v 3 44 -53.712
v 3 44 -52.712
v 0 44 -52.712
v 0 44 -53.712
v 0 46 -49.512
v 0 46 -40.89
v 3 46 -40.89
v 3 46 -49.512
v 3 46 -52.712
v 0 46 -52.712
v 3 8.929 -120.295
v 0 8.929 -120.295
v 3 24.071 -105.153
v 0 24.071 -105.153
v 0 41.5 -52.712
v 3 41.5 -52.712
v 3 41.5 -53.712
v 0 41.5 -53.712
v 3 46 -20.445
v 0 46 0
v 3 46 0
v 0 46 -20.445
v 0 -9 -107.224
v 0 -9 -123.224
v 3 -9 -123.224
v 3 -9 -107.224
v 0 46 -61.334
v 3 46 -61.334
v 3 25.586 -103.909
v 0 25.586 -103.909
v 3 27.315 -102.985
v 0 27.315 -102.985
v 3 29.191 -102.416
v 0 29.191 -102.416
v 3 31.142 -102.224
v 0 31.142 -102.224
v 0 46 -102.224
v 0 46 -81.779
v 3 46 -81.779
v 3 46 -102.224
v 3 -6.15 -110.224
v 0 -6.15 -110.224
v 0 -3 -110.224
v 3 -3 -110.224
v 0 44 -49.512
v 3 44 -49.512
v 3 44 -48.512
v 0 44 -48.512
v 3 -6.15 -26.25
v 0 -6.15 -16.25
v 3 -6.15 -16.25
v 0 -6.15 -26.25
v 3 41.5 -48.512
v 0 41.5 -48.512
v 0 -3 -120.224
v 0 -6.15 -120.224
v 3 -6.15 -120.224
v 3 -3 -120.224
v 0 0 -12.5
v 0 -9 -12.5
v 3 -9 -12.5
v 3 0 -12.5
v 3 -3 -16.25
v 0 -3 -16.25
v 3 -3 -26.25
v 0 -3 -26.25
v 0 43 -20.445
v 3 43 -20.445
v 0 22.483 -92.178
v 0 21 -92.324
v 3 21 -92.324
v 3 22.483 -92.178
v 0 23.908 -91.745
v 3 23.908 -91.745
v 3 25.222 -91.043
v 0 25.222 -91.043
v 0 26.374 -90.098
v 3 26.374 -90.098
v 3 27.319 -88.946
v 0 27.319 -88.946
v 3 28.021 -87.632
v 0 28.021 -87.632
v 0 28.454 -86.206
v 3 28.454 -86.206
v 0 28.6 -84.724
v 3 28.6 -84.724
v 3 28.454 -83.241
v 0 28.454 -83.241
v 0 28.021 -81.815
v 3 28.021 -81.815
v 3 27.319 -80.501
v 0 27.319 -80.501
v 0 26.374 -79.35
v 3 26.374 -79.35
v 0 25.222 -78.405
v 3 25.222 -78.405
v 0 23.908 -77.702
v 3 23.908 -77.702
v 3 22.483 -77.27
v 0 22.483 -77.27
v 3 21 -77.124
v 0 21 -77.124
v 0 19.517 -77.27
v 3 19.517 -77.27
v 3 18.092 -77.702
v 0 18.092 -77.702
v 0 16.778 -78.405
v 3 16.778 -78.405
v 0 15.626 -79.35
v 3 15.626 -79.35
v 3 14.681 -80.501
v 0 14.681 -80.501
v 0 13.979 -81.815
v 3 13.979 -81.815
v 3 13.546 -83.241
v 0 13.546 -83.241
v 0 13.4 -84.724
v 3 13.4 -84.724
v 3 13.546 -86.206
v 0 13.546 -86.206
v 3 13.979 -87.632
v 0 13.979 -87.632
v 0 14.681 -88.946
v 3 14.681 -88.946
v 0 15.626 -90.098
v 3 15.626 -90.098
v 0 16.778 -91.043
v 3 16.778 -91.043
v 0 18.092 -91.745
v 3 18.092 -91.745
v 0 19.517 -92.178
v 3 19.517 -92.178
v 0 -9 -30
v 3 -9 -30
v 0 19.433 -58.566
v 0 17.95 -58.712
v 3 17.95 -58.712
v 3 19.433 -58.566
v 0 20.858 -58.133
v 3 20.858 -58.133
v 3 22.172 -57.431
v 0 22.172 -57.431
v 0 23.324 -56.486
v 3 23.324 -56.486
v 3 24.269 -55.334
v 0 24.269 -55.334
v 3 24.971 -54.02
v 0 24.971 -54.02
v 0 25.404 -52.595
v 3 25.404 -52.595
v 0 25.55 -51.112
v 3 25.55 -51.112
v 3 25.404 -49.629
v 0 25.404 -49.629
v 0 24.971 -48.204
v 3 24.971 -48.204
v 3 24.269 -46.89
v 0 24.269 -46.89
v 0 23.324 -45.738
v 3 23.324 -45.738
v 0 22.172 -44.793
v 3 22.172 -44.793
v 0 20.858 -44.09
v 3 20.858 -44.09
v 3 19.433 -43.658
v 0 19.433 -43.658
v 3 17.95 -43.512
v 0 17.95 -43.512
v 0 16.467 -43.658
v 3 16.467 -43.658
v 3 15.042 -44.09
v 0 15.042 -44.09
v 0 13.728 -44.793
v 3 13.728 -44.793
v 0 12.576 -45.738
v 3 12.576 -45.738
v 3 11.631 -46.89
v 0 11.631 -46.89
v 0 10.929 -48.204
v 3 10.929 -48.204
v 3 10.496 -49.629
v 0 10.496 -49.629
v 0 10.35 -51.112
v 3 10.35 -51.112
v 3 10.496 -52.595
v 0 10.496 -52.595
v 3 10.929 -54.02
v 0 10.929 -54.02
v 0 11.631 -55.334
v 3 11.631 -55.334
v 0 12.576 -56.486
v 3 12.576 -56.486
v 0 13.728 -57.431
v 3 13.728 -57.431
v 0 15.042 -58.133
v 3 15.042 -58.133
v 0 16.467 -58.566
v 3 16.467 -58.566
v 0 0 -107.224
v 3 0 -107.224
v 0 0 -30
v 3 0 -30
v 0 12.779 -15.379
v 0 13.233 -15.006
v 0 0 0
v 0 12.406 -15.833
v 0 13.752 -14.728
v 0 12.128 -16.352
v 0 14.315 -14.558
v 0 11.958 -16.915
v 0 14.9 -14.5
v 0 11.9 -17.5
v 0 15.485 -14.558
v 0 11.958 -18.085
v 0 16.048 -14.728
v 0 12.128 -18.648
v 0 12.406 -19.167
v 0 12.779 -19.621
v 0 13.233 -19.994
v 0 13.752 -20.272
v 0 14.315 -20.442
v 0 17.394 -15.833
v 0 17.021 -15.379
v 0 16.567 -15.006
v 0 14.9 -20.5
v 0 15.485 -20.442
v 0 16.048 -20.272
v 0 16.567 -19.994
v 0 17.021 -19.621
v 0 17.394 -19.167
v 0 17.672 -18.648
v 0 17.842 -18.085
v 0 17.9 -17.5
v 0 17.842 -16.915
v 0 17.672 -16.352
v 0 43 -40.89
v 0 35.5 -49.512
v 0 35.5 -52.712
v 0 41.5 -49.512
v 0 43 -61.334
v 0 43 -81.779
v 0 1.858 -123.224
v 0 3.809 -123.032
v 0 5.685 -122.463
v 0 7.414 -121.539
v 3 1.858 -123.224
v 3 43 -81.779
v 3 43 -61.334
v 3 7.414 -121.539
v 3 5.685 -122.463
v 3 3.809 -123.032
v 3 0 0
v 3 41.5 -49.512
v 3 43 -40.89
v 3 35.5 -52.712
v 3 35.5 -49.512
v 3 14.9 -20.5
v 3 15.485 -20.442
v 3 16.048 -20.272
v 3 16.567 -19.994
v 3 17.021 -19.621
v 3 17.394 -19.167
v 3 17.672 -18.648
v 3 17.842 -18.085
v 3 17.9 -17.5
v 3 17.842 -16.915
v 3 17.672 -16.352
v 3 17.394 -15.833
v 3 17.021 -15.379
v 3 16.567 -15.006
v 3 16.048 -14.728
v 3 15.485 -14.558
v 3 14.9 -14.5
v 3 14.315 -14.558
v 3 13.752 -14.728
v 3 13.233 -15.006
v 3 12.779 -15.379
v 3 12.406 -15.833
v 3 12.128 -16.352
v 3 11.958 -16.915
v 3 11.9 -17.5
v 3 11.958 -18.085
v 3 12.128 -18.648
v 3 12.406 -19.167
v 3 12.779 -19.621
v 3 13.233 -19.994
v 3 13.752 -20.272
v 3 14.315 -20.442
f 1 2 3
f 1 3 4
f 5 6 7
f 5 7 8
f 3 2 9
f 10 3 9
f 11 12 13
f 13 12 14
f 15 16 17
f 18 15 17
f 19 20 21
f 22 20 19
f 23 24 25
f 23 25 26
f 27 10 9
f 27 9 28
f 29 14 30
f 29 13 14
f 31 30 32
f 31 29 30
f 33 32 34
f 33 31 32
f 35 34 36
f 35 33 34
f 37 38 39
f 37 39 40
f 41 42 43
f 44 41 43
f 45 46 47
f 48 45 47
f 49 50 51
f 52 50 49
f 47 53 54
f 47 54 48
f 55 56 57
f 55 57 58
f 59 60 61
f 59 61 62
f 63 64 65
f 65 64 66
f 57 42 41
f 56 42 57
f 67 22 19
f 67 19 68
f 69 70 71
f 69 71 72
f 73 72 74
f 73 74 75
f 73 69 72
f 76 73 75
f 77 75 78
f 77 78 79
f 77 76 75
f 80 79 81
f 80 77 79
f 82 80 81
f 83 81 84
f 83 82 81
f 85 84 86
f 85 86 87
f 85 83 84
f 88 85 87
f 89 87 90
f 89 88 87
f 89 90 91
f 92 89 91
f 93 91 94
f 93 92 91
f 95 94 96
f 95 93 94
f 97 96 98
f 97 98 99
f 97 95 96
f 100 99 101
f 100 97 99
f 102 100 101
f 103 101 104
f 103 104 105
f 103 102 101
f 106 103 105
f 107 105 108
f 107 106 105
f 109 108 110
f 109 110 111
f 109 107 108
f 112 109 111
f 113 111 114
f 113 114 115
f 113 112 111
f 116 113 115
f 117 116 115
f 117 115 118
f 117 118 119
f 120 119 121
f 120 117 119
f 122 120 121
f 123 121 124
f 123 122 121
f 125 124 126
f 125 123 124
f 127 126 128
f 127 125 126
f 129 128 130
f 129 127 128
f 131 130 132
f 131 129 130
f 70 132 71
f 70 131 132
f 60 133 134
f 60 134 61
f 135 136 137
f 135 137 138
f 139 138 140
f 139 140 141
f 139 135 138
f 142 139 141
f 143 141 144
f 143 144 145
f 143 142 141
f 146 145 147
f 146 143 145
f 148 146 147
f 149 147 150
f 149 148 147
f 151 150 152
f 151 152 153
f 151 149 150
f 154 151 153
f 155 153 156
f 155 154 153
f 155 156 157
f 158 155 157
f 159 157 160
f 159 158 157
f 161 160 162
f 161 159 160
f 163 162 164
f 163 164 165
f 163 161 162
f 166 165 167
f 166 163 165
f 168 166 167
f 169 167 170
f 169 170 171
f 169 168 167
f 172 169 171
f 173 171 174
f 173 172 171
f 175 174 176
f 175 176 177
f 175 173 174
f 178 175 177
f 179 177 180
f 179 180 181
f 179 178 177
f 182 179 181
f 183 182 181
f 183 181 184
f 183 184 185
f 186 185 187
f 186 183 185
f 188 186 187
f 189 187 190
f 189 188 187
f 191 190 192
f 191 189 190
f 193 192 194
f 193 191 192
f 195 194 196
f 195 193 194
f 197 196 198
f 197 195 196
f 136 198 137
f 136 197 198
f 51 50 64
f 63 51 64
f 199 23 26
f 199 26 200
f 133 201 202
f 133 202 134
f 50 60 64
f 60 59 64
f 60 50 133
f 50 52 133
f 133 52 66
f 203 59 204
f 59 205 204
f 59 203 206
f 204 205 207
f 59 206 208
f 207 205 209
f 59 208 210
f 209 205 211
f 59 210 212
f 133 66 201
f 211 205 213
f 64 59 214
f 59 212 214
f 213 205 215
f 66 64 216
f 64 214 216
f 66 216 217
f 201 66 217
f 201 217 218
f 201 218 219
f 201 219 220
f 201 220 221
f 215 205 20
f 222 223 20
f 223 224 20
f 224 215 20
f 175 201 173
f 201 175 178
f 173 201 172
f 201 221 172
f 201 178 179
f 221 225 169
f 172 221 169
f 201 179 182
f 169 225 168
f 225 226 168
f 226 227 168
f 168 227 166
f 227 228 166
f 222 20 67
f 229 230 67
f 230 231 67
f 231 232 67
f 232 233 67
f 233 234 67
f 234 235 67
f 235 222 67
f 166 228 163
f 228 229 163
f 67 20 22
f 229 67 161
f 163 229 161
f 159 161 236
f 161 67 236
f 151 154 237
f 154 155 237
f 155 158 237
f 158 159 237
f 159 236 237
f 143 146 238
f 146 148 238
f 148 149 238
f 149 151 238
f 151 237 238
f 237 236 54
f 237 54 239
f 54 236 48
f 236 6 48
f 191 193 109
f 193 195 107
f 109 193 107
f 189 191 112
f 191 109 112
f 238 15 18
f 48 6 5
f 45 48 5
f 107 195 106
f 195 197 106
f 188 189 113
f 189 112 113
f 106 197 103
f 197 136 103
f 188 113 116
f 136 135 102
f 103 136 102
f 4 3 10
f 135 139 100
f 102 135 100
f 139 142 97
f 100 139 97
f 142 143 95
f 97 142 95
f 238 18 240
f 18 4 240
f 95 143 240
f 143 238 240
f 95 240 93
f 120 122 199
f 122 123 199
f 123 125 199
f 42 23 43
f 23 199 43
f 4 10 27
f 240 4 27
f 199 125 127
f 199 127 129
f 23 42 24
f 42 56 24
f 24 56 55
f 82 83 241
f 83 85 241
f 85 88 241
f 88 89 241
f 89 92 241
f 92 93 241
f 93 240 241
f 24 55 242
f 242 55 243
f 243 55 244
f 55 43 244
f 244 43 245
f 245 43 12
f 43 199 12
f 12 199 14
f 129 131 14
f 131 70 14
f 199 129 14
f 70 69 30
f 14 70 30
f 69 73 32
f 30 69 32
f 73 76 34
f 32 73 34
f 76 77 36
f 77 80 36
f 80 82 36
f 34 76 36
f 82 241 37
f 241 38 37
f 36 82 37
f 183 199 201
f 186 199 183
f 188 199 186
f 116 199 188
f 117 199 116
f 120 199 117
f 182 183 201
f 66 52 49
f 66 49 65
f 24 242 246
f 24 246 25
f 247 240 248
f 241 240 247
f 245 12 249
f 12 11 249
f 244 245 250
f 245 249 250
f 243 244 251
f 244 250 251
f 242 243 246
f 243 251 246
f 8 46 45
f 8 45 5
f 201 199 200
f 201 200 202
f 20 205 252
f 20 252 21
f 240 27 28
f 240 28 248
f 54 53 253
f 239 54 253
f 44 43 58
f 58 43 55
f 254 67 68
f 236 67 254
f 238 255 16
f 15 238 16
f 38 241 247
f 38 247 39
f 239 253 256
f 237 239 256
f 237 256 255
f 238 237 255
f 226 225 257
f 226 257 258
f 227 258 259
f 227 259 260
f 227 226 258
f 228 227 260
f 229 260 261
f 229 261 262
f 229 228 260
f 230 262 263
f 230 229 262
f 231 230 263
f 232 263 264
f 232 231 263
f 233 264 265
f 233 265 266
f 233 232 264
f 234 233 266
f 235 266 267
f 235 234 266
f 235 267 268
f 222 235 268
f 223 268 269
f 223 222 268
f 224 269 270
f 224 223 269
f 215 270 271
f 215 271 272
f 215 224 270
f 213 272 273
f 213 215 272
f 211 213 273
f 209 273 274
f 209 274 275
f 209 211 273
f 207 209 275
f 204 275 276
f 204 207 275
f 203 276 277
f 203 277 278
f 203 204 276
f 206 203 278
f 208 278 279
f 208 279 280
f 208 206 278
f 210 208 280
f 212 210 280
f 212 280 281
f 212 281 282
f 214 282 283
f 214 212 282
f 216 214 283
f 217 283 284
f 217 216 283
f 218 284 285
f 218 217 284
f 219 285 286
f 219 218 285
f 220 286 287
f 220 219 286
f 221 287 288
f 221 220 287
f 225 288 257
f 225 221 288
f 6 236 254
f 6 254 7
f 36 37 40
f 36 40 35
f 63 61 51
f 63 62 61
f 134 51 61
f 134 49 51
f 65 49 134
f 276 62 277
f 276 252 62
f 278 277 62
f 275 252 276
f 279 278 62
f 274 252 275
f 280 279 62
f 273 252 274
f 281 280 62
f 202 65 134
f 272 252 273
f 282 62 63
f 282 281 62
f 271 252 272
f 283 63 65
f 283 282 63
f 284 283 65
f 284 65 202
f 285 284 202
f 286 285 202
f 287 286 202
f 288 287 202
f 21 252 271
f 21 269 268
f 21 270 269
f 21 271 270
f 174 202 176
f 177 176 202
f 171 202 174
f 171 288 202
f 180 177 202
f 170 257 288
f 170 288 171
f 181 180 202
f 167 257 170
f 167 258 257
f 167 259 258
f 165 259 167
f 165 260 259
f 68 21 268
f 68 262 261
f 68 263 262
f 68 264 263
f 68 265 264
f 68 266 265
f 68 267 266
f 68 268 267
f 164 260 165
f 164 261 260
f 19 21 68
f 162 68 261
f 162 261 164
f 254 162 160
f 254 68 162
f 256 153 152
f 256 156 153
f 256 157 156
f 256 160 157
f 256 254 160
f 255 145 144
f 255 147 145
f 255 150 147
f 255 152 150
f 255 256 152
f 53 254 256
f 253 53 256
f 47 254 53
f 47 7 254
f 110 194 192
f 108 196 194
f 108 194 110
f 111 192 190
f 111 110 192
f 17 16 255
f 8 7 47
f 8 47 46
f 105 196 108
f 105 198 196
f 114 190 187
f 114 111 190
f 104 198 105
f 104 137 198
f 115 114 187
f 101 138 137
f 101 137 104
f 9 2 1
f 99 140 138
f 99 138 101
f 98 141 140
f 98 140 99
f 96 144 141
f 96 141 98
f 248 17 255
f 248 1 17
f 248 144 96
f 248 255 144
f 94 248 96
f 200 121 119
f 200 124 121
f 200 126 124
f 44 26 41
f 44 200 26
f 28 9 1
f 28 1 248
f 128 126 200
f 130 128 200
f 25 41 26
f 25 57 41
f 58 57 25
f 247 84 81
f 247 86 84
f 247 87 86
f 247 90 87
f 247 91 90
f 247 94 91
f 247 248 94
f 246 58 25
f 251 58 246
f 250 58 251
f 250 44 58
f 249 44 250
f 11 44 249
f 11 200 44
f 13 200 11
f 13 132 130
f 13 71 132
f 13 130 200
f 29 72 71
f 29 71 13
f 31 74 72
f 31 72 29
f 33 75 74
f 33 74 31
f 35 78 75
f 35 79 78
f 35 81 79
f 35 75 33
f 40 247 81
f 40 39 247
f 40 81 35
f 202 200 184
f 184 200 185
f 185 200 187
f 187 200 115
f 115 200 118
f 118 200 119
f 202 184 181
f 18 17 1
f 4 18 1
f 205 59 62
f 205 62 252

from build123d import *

# Parameters (mm, degrees)
SKETCH1_R               = 7.6
SKETCH1_R_2             = 3
SKETCH1_W               = 10
SKETCH1_H               = 3.15
BOSS_EXTRUDE1_DEPTH     = 3
FILLET1_R               = 10
SKETCH2_W               = 3.2
SKETCH2_H               = 6
SKETCH2_H_2             = 2.5
SKETCH2_W_2             = 1
SKETCH2_H_3             = 2
CUT_EXTRUDE1_DEPTH      = 1
CUT_EXTRUDE1_DEPTH_BACK = 4


with BuildPart() as part:
    # Sketch1 → Boss-Extrude1 (new body)
    with BuildSketch(Plane(origin=(0, 0, 0), x_dir=(0, 0, -1), z_dir=(1, 0, 0))):
        Polygon((102.223805307, 6), (123.223805307, 6), (102.223805307, 27), align=None)
        Polygon((102.223805307, 6), (123.223805307, 6), (123.223805307, -9), (107.223805307, -9), (107.223805307, 0), (30, 0), (30, -9), (12.5, -9), (12.5, 0), (0, 0), (0, 46), (20.444761061, 46), (20.444761061, 43), (40.889522123, 43), (40.889522123, 46), (61.334283184, 46), (61.334283184, 43), (81.779044246, 43), (81.779044246, 46), (102.223805307, 46), align=None)
        with Locations((84.723805307, 21)):
            Circle(SKETCH1_R, mode=Mode.SUBTRACT)
        with Locations((51.111902654, 17.95)):
            Circle(SKETCH1_R, mode=Mode.SUBTRACT)
        with Locations((17.5, 14.9)):
            Circle(SKETCH1_R_2, mode=Mode.SUBTRACT)
        with Locations((115.223805307, -4.575)):
            Rectangle(SKETCH1_W, SKETCH1_H, mode=Mode.SUBTRACT)
        with Locations((21.25, -4.575)):
            Rectangle(SKETCH1_W, SKETCH1_H, mode=Mode.SUBTRACT)
    extrude(amount=BOSS_EXTRUDE1_DEPTH)

    # Fillet1
    fillet1_edges = [part.edges().sort_by_distance(p)[0] for p in [
        (1.5, 6, -123.223805307),
        (1.5, 27, -102.223805307),
    ]]
    fillet(fillet1_edges, radius=FILLET1_R)

    # Sketch2 → Cut-Extrude1 (cut, two sides)
    with BuildSketch(Plane(origin=(3, 0, 0), x_dir=(0, 0, -1), z_dir=(1, 0, 0))) as cut_extrude1_sk:
        with Locations((51.111902654, 38.5)):
            Rectangle(SKETCH2_W, SKETCH2_H)
        with Locations((51.111902654, 42.75)):
            Rectangle(SKETCH2_W, SKETCH2_H_2)
        with Locations((49.011902654, 42.75)):
            Rectangle(SKETCH2_W_2, SKETCH2_H_2)
        with Locations((51.111902654, 45)):
            Rectangle(SKETCH2_W, SKETCH2_H_3)
        with Locations((53.211902654, 42.75)):
            Rectangle(SKETCH2_W_2, SKETCH2_H_2)
    extrude(amount=CUT_EXTRUDE1_DEPTH, mode=Mode.SUBTRACT)
    extrude(cut_extrude1_sk.sketch, amount=-CUT_EXTRUDE1_DEPTH_BACK, mode=Mode.SUBTRACT)


solid = part.part
